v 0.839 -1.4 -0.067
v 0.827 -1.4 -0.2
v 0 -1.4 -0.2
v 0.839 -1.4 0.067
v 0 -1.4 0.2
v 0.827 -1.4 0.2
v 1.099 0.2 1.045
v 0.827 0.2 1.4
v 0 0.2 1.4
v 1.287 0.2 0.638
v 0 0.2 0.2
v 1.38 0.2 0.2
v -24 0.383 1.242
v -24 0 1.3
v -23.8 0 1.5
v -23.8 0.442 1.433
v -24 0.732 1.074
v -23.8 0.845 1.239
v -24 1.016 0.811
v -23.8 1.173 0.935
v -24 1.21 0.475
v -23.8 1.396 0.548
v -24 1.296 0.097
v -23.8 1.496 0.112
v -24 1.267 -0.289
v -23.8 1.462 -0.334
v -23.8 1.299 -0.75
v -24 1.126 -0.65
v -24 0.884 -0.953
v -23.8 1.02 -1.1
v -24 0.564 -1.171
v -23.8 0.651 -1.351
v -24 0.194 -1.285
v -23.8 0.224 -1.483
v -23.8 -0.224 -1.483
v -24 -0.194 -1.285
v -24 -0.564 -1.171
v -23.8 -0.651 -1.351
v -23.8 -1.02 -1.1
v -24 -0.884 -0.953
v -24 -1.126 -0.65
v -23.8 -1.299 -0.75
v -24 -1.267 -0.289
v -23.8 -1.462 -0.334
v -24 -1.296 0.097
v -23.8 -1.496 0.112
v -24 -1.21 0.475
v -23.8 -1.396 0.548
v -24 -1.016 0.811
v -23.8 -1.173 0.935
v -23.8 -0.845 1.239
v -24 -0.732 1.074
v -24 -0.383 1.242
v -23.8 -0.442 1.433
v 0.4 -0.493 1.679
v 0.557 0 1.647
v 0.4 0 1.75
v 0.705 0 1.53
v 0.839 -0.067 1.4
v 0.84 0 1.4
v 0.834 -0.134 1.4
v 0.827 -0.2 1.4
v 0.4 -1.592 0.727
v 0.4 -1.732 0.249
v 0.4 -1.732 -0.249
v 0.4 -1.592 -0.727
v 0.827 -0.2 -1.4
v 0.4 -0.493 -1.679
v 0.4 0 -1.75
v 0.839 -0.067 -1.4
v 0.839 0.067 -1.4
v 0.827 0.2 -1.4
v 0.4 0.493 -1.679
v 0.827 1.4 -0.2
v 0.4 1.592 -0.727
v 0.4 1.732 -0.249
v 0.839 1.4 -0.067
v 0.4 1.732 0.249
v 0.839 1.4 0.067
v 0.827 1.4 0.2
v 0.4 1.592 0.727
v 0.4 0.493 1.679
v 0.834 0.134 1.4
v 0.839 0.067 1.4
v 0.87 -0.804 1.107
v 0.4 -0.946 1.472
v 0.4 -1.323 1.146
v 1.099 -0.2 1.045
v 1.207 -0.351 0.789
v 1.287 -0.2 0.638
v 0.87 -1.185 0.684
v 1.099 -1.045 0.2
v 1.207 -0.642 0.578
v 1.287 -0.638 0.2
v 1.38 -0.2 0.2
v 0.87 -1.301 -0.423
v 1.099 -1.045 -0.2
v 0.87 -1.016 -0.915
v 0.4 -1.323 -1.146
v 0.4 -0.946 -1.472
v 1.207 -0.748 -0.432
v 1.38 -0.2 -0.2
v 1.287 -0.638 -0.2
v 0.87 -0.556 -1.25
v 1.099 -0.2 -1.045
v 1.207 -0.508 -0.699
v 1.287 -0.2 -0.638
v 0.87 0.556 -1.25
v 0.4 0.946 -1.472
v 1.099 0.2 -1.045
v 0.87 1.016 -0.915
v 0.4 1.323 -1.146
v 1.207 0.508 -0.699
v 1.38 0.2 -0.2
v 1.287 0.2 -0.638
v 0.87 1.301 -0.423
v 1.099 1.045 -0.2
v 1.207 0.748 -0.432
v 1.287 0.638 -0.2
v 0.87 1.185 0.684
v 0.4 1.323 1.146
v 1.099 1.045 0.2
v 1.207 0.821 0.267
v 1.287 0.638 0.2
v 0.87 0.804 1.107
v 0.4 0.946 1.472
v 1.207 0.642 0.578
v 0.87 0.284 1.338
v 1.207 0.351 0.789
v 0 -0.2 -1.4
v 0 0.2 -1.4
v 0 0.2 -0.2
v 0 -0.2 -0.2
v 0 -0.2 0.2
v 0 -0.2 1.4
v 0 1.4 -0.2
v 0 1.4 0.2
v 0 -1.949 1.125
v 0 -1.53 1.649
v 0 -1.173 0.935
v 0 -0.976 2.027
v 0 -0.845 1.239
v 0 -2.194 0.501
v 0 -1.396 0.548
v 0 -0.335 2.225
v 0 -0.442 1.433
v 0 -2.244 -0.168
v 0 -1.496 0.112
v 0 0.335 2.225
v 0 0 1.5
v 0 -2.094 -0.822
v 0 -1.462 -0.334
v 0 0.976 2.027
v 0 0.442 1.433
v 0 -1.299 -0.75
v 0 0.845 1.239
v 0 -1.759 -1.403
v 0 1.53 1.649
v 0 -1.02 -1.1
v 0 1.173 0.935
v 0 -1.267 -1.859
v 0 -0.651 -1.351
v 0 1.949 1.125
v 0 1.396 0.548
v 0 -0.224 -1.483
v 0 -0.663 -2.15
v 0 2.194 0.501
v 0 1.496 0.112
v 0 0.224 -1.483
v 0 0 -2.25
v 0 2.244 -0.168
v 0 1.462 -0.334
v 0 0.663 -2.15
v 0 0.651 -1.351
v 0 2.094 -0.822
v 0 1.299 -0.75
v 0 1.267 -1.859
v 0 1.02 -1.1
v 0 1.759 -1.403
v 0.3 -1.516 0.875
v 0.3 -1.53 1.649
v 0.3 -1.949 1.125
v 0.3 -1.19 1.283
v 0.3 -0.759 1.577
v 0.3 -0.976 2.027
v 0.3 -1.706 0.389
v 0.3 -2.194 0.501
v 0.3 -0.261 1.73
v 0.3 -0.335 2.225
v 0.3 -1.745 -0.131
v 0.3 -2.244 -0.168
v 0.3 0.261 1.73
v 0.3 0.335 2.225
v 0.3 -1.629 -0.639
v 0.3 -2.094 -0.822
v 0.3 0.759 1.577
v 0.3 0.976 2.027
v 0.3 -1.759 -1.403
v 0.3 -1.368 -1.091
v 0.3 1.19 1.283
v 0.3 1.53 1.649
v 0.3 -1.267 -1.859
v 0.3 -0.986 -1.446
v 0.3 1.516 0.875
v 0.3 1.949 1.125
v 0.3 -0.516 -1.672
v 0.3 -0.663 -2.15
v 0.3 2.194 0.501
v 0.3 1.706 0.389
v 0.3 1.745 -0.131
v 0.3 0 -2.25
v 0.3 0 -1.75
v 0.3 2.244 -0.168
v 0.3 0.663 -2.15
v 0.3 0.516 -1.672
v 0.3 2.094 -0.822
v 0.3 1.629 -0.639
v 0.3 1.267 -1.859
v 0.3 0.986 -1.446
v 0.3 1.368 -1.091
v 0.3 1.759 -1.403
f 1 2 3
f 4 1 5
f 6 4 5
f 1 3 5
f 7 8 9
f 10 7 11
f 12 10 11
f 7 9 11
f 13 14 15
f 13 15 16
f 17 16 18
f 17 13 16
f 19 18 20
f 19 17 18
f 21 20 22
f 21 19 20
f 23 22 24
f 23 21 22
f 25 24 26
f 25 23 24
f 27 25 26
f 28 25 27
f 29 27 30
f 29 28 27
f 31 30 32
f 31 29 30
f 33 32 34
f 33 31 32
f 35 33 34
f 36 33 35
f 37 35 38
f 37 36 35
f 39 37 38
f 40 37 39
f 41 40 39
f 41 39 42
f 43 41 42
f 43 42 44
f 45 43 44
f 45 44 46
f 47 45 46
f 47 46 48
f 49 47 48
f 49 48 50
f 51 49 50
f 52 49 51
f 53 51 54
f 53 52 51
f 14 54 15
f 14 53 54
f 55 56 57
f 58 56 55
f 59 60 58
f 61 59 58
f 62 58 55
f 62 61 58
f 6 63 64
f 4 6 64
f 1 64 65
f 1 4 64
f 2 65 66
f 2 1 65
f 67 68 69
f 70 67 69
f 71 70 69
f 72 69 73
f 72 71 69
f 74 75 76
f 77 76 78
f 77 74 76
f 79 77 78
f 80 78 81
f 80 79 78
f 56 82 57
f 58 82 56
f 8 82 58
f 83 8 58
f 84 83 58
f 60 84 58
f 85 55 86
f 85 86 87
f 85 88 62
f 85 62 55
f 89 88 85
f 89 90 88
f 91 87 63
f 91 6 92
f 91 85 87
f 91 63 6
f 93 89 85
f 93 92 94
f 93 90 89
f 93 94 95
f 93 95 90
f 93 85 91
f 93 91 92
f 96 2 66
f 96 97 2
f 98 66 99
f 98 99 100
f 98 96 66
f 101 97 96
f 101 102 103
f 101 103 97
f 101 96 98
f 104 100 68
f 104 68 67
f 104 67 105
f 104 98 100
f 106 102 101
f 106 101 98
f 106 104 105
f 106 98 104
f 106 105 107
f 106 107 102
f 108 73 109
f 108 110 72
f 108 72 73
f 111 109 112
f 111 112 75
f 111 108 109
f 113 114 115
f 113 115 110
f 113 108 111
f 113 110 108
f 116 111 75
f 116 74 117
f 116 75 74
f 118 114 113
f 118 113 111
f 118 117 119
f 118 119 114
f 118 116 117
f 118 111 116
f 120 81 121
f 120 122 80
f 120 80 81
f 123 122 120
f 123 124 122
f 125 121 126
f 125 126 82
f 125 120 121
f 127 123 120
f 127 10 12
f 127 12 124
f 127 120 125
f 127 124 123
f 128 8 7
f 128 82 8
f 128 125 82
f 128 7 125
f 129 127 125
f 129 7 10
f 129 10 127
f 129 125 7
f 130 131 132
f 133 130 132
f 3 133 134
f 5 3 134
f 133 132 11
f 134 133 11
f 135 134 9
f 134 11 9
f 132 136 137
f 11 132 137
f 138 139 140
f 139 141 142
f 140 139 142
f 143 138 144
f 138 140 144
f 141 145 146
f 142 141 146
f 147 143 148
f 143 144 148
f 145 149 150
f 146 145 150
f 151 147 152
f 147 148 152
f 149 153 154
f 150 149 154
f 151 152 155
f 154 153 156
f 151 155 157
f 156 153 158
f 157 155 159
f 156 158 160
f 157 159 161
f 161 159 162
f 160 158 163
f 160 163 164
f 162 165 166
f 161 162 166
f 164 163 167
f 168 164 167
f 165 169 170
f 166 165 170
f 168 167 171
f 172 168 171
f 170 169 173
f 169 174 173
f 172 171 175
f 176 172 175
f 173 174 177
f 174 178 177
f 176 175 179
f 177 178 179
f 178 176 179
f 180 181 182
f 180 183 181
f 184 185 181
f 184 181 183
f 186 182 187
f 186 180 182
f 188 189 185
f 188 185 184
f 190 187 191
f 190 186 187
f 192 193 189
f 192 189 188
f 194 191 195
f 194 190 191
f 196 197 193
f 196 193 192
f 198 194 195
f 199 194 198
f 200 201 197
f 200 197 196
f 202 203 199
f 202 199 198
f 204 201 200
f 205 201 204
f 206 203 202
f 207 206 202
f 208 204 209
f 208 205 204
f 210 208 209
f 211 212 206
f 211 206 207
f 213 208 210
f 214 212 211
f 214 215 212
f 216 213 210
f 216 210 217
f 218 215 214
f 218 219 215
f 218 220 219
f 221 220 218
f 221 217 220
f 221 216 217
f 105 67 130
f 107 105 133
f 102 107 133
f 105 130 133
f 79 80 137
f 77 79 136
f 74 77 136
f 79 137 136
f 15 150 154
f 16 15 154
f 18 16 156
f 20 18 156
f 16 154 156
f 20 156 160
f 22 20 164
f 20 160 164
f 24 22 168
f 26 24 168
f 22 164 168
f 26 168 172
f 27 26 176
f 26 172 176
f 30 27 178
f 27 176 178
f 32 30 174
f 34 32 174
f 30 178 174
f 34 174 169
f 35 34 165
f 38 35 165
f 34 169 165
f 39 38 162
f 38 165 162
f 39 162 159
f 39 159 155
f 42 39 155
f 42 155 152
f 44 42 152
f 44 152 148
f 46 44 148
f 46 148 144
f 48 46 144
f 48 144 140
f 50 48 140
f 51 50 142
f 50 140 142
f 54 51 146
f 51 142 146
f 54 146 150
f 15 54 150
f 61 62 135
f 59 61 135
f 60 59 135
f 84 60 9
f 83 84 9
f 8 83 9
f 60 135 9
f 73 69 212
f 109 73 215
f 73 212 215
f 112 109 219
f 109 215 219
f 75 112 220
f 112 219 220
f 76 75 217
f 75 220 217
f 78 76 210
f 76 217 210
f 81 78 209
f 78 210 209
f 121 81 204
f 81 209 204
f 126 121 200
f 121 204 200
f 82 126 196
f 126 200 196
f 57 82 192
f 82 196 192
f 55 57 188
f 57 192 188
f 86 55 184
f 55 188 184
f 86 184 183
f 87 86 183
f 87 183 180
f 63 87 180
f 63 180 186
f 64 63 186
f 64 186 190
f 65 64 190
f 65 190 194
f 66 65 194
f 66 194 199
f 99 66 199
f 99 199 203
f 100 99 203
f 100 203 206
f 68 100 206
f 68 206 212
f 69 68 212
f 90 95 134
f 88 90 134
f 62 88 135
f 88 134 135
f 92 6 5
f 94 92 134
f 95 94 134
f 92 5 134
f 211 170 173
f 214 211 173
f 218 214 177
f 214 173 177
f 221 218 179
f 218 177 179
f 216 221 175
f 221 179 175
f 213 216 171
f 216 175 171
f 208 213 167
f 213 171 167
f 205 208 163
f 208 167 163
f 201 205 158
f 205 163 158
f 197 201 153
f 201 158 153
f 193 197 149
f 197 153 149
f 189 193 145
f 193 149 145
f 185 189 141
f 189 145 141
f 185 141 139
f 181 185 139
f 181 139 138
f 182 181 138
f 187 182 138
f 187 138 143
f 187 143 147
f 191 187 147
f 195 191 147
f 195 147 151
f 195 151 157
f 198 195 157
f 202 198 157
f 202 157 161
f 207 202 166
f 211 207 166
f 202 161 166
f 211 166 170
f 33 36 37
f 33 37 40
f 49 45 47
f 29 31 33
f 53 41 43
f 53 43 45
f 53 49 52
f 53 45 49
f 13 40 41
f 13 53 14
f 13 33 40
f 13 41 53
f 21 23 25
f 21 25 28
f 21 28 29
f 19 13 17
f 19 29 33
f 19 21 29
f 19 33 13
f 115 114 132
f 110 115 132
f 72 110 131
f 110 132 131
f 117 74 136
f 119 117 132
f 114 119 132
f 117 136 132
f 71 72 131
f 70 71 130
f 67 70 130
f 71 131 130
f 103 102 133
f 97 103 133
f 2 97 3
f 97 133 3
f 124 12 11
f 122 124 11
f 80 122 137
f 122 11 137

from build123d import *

# Parameters (mm, degrees)
SKETCH_1_R          = 2.25
EXTRUDE_1_DEPTH     = 0.3
SKETCH_2_R          = 1.5
EXTRUDE_3_DEPTH     = 24
SKETCH_6_R          = 1.75
EXTRUDE_4_DEPTH     = 0.1
DOME_1_FACE_RADIUS  = 1.75
DOME_1_HEIGHT       = 1
CUT_EXTRUDE_2_DEPTH = 2
CHAMFER_1_SIZE      = 0.2


with BuildPart() as part:
    # 草图1 → 凸台-拉伸1 (new body)
    with BuildSketch(Plane(origin=(0, 0, 0), x_dir=(0, 0, -1), z_dir=(1, 0, 0))):
        Circle(SKETCH_1_R)
    extrude(amount=EXTRUDE_1_DEPTH)

    # 草图2 → 凸台-拉伸3 (add)
    with BuildSketch(Plane.ZY):
        Circle(SKETCH_2_R)
    extrude(amount=EXTRUDE_3_DEPTH)

    # 草图6 → 凸台-拉伸4 (add)
    with BuildSketch(Plane(origin=(0.3, 0, 0), x_dir=(0, 0, -1), z_dir=(1, 0, 0))):
        Circle(SKETCH_6_R)
    extrude(amount=EXTRUDE_4_DEPTH)

    # 圆顶1: a dome of height H over a round flat face of radius A is a cap of a sphere of radius (A * A + H * H) / (2 * H)
    dome_1_r = (DOME_1_FACE_RADIUS * DOME_1_FACE_RADIUS + DOME_1_HEIGHT * DOME_1_HEIGHT) / (2 * DOME_1_HEIGHT)
    dome_1_base = Plane((0.4, 0, 0), z_dir=(1, 0, 0))
    with Locations(dome_1_base.offset(DOME_1_HEIGHT - dome_1_r)):
        dome_1_ball = Sphere(dome_1_r, mode=Mode.PRIVATE)
    add(split(dome_1_ball, bisect_by=dome_1_base, keep=Keep.TOP, mode=Mode.PRIVATE))

    # 草图5 → 切除-拉伸2 (cut)
    with BuildSketch(Plane(origin=(0, 0, 0), x_dir=(0, 0, -1), z_dir=(1, 0, 0))):
        Polygon((0.2, 0.2), (1.4, 0.2), (1.4, -0.2), (0.2, -0.2), (0.2, -1.4), (-0.2, -1.4), (-0.2, -0.2), (-1.4, -0.2), (-1.4, 0.2), (-0.2, 0.2), (-0.2, 1.4), (0.2, 1.4), align=None)
    extrude(amount=CUT_EXTRUDE_2_DEPTH, mode=Mode.SUBTRACT)

    # 倒角1
    chamfer_1_edges = [part.edges().sort_by_distance(p)[0] for p in [
        (-24, 0, -1.5),
    ]]
    chamfer(chamfer_1_edges, length=CHAMFER_1_SIZE)


solid = part.part
